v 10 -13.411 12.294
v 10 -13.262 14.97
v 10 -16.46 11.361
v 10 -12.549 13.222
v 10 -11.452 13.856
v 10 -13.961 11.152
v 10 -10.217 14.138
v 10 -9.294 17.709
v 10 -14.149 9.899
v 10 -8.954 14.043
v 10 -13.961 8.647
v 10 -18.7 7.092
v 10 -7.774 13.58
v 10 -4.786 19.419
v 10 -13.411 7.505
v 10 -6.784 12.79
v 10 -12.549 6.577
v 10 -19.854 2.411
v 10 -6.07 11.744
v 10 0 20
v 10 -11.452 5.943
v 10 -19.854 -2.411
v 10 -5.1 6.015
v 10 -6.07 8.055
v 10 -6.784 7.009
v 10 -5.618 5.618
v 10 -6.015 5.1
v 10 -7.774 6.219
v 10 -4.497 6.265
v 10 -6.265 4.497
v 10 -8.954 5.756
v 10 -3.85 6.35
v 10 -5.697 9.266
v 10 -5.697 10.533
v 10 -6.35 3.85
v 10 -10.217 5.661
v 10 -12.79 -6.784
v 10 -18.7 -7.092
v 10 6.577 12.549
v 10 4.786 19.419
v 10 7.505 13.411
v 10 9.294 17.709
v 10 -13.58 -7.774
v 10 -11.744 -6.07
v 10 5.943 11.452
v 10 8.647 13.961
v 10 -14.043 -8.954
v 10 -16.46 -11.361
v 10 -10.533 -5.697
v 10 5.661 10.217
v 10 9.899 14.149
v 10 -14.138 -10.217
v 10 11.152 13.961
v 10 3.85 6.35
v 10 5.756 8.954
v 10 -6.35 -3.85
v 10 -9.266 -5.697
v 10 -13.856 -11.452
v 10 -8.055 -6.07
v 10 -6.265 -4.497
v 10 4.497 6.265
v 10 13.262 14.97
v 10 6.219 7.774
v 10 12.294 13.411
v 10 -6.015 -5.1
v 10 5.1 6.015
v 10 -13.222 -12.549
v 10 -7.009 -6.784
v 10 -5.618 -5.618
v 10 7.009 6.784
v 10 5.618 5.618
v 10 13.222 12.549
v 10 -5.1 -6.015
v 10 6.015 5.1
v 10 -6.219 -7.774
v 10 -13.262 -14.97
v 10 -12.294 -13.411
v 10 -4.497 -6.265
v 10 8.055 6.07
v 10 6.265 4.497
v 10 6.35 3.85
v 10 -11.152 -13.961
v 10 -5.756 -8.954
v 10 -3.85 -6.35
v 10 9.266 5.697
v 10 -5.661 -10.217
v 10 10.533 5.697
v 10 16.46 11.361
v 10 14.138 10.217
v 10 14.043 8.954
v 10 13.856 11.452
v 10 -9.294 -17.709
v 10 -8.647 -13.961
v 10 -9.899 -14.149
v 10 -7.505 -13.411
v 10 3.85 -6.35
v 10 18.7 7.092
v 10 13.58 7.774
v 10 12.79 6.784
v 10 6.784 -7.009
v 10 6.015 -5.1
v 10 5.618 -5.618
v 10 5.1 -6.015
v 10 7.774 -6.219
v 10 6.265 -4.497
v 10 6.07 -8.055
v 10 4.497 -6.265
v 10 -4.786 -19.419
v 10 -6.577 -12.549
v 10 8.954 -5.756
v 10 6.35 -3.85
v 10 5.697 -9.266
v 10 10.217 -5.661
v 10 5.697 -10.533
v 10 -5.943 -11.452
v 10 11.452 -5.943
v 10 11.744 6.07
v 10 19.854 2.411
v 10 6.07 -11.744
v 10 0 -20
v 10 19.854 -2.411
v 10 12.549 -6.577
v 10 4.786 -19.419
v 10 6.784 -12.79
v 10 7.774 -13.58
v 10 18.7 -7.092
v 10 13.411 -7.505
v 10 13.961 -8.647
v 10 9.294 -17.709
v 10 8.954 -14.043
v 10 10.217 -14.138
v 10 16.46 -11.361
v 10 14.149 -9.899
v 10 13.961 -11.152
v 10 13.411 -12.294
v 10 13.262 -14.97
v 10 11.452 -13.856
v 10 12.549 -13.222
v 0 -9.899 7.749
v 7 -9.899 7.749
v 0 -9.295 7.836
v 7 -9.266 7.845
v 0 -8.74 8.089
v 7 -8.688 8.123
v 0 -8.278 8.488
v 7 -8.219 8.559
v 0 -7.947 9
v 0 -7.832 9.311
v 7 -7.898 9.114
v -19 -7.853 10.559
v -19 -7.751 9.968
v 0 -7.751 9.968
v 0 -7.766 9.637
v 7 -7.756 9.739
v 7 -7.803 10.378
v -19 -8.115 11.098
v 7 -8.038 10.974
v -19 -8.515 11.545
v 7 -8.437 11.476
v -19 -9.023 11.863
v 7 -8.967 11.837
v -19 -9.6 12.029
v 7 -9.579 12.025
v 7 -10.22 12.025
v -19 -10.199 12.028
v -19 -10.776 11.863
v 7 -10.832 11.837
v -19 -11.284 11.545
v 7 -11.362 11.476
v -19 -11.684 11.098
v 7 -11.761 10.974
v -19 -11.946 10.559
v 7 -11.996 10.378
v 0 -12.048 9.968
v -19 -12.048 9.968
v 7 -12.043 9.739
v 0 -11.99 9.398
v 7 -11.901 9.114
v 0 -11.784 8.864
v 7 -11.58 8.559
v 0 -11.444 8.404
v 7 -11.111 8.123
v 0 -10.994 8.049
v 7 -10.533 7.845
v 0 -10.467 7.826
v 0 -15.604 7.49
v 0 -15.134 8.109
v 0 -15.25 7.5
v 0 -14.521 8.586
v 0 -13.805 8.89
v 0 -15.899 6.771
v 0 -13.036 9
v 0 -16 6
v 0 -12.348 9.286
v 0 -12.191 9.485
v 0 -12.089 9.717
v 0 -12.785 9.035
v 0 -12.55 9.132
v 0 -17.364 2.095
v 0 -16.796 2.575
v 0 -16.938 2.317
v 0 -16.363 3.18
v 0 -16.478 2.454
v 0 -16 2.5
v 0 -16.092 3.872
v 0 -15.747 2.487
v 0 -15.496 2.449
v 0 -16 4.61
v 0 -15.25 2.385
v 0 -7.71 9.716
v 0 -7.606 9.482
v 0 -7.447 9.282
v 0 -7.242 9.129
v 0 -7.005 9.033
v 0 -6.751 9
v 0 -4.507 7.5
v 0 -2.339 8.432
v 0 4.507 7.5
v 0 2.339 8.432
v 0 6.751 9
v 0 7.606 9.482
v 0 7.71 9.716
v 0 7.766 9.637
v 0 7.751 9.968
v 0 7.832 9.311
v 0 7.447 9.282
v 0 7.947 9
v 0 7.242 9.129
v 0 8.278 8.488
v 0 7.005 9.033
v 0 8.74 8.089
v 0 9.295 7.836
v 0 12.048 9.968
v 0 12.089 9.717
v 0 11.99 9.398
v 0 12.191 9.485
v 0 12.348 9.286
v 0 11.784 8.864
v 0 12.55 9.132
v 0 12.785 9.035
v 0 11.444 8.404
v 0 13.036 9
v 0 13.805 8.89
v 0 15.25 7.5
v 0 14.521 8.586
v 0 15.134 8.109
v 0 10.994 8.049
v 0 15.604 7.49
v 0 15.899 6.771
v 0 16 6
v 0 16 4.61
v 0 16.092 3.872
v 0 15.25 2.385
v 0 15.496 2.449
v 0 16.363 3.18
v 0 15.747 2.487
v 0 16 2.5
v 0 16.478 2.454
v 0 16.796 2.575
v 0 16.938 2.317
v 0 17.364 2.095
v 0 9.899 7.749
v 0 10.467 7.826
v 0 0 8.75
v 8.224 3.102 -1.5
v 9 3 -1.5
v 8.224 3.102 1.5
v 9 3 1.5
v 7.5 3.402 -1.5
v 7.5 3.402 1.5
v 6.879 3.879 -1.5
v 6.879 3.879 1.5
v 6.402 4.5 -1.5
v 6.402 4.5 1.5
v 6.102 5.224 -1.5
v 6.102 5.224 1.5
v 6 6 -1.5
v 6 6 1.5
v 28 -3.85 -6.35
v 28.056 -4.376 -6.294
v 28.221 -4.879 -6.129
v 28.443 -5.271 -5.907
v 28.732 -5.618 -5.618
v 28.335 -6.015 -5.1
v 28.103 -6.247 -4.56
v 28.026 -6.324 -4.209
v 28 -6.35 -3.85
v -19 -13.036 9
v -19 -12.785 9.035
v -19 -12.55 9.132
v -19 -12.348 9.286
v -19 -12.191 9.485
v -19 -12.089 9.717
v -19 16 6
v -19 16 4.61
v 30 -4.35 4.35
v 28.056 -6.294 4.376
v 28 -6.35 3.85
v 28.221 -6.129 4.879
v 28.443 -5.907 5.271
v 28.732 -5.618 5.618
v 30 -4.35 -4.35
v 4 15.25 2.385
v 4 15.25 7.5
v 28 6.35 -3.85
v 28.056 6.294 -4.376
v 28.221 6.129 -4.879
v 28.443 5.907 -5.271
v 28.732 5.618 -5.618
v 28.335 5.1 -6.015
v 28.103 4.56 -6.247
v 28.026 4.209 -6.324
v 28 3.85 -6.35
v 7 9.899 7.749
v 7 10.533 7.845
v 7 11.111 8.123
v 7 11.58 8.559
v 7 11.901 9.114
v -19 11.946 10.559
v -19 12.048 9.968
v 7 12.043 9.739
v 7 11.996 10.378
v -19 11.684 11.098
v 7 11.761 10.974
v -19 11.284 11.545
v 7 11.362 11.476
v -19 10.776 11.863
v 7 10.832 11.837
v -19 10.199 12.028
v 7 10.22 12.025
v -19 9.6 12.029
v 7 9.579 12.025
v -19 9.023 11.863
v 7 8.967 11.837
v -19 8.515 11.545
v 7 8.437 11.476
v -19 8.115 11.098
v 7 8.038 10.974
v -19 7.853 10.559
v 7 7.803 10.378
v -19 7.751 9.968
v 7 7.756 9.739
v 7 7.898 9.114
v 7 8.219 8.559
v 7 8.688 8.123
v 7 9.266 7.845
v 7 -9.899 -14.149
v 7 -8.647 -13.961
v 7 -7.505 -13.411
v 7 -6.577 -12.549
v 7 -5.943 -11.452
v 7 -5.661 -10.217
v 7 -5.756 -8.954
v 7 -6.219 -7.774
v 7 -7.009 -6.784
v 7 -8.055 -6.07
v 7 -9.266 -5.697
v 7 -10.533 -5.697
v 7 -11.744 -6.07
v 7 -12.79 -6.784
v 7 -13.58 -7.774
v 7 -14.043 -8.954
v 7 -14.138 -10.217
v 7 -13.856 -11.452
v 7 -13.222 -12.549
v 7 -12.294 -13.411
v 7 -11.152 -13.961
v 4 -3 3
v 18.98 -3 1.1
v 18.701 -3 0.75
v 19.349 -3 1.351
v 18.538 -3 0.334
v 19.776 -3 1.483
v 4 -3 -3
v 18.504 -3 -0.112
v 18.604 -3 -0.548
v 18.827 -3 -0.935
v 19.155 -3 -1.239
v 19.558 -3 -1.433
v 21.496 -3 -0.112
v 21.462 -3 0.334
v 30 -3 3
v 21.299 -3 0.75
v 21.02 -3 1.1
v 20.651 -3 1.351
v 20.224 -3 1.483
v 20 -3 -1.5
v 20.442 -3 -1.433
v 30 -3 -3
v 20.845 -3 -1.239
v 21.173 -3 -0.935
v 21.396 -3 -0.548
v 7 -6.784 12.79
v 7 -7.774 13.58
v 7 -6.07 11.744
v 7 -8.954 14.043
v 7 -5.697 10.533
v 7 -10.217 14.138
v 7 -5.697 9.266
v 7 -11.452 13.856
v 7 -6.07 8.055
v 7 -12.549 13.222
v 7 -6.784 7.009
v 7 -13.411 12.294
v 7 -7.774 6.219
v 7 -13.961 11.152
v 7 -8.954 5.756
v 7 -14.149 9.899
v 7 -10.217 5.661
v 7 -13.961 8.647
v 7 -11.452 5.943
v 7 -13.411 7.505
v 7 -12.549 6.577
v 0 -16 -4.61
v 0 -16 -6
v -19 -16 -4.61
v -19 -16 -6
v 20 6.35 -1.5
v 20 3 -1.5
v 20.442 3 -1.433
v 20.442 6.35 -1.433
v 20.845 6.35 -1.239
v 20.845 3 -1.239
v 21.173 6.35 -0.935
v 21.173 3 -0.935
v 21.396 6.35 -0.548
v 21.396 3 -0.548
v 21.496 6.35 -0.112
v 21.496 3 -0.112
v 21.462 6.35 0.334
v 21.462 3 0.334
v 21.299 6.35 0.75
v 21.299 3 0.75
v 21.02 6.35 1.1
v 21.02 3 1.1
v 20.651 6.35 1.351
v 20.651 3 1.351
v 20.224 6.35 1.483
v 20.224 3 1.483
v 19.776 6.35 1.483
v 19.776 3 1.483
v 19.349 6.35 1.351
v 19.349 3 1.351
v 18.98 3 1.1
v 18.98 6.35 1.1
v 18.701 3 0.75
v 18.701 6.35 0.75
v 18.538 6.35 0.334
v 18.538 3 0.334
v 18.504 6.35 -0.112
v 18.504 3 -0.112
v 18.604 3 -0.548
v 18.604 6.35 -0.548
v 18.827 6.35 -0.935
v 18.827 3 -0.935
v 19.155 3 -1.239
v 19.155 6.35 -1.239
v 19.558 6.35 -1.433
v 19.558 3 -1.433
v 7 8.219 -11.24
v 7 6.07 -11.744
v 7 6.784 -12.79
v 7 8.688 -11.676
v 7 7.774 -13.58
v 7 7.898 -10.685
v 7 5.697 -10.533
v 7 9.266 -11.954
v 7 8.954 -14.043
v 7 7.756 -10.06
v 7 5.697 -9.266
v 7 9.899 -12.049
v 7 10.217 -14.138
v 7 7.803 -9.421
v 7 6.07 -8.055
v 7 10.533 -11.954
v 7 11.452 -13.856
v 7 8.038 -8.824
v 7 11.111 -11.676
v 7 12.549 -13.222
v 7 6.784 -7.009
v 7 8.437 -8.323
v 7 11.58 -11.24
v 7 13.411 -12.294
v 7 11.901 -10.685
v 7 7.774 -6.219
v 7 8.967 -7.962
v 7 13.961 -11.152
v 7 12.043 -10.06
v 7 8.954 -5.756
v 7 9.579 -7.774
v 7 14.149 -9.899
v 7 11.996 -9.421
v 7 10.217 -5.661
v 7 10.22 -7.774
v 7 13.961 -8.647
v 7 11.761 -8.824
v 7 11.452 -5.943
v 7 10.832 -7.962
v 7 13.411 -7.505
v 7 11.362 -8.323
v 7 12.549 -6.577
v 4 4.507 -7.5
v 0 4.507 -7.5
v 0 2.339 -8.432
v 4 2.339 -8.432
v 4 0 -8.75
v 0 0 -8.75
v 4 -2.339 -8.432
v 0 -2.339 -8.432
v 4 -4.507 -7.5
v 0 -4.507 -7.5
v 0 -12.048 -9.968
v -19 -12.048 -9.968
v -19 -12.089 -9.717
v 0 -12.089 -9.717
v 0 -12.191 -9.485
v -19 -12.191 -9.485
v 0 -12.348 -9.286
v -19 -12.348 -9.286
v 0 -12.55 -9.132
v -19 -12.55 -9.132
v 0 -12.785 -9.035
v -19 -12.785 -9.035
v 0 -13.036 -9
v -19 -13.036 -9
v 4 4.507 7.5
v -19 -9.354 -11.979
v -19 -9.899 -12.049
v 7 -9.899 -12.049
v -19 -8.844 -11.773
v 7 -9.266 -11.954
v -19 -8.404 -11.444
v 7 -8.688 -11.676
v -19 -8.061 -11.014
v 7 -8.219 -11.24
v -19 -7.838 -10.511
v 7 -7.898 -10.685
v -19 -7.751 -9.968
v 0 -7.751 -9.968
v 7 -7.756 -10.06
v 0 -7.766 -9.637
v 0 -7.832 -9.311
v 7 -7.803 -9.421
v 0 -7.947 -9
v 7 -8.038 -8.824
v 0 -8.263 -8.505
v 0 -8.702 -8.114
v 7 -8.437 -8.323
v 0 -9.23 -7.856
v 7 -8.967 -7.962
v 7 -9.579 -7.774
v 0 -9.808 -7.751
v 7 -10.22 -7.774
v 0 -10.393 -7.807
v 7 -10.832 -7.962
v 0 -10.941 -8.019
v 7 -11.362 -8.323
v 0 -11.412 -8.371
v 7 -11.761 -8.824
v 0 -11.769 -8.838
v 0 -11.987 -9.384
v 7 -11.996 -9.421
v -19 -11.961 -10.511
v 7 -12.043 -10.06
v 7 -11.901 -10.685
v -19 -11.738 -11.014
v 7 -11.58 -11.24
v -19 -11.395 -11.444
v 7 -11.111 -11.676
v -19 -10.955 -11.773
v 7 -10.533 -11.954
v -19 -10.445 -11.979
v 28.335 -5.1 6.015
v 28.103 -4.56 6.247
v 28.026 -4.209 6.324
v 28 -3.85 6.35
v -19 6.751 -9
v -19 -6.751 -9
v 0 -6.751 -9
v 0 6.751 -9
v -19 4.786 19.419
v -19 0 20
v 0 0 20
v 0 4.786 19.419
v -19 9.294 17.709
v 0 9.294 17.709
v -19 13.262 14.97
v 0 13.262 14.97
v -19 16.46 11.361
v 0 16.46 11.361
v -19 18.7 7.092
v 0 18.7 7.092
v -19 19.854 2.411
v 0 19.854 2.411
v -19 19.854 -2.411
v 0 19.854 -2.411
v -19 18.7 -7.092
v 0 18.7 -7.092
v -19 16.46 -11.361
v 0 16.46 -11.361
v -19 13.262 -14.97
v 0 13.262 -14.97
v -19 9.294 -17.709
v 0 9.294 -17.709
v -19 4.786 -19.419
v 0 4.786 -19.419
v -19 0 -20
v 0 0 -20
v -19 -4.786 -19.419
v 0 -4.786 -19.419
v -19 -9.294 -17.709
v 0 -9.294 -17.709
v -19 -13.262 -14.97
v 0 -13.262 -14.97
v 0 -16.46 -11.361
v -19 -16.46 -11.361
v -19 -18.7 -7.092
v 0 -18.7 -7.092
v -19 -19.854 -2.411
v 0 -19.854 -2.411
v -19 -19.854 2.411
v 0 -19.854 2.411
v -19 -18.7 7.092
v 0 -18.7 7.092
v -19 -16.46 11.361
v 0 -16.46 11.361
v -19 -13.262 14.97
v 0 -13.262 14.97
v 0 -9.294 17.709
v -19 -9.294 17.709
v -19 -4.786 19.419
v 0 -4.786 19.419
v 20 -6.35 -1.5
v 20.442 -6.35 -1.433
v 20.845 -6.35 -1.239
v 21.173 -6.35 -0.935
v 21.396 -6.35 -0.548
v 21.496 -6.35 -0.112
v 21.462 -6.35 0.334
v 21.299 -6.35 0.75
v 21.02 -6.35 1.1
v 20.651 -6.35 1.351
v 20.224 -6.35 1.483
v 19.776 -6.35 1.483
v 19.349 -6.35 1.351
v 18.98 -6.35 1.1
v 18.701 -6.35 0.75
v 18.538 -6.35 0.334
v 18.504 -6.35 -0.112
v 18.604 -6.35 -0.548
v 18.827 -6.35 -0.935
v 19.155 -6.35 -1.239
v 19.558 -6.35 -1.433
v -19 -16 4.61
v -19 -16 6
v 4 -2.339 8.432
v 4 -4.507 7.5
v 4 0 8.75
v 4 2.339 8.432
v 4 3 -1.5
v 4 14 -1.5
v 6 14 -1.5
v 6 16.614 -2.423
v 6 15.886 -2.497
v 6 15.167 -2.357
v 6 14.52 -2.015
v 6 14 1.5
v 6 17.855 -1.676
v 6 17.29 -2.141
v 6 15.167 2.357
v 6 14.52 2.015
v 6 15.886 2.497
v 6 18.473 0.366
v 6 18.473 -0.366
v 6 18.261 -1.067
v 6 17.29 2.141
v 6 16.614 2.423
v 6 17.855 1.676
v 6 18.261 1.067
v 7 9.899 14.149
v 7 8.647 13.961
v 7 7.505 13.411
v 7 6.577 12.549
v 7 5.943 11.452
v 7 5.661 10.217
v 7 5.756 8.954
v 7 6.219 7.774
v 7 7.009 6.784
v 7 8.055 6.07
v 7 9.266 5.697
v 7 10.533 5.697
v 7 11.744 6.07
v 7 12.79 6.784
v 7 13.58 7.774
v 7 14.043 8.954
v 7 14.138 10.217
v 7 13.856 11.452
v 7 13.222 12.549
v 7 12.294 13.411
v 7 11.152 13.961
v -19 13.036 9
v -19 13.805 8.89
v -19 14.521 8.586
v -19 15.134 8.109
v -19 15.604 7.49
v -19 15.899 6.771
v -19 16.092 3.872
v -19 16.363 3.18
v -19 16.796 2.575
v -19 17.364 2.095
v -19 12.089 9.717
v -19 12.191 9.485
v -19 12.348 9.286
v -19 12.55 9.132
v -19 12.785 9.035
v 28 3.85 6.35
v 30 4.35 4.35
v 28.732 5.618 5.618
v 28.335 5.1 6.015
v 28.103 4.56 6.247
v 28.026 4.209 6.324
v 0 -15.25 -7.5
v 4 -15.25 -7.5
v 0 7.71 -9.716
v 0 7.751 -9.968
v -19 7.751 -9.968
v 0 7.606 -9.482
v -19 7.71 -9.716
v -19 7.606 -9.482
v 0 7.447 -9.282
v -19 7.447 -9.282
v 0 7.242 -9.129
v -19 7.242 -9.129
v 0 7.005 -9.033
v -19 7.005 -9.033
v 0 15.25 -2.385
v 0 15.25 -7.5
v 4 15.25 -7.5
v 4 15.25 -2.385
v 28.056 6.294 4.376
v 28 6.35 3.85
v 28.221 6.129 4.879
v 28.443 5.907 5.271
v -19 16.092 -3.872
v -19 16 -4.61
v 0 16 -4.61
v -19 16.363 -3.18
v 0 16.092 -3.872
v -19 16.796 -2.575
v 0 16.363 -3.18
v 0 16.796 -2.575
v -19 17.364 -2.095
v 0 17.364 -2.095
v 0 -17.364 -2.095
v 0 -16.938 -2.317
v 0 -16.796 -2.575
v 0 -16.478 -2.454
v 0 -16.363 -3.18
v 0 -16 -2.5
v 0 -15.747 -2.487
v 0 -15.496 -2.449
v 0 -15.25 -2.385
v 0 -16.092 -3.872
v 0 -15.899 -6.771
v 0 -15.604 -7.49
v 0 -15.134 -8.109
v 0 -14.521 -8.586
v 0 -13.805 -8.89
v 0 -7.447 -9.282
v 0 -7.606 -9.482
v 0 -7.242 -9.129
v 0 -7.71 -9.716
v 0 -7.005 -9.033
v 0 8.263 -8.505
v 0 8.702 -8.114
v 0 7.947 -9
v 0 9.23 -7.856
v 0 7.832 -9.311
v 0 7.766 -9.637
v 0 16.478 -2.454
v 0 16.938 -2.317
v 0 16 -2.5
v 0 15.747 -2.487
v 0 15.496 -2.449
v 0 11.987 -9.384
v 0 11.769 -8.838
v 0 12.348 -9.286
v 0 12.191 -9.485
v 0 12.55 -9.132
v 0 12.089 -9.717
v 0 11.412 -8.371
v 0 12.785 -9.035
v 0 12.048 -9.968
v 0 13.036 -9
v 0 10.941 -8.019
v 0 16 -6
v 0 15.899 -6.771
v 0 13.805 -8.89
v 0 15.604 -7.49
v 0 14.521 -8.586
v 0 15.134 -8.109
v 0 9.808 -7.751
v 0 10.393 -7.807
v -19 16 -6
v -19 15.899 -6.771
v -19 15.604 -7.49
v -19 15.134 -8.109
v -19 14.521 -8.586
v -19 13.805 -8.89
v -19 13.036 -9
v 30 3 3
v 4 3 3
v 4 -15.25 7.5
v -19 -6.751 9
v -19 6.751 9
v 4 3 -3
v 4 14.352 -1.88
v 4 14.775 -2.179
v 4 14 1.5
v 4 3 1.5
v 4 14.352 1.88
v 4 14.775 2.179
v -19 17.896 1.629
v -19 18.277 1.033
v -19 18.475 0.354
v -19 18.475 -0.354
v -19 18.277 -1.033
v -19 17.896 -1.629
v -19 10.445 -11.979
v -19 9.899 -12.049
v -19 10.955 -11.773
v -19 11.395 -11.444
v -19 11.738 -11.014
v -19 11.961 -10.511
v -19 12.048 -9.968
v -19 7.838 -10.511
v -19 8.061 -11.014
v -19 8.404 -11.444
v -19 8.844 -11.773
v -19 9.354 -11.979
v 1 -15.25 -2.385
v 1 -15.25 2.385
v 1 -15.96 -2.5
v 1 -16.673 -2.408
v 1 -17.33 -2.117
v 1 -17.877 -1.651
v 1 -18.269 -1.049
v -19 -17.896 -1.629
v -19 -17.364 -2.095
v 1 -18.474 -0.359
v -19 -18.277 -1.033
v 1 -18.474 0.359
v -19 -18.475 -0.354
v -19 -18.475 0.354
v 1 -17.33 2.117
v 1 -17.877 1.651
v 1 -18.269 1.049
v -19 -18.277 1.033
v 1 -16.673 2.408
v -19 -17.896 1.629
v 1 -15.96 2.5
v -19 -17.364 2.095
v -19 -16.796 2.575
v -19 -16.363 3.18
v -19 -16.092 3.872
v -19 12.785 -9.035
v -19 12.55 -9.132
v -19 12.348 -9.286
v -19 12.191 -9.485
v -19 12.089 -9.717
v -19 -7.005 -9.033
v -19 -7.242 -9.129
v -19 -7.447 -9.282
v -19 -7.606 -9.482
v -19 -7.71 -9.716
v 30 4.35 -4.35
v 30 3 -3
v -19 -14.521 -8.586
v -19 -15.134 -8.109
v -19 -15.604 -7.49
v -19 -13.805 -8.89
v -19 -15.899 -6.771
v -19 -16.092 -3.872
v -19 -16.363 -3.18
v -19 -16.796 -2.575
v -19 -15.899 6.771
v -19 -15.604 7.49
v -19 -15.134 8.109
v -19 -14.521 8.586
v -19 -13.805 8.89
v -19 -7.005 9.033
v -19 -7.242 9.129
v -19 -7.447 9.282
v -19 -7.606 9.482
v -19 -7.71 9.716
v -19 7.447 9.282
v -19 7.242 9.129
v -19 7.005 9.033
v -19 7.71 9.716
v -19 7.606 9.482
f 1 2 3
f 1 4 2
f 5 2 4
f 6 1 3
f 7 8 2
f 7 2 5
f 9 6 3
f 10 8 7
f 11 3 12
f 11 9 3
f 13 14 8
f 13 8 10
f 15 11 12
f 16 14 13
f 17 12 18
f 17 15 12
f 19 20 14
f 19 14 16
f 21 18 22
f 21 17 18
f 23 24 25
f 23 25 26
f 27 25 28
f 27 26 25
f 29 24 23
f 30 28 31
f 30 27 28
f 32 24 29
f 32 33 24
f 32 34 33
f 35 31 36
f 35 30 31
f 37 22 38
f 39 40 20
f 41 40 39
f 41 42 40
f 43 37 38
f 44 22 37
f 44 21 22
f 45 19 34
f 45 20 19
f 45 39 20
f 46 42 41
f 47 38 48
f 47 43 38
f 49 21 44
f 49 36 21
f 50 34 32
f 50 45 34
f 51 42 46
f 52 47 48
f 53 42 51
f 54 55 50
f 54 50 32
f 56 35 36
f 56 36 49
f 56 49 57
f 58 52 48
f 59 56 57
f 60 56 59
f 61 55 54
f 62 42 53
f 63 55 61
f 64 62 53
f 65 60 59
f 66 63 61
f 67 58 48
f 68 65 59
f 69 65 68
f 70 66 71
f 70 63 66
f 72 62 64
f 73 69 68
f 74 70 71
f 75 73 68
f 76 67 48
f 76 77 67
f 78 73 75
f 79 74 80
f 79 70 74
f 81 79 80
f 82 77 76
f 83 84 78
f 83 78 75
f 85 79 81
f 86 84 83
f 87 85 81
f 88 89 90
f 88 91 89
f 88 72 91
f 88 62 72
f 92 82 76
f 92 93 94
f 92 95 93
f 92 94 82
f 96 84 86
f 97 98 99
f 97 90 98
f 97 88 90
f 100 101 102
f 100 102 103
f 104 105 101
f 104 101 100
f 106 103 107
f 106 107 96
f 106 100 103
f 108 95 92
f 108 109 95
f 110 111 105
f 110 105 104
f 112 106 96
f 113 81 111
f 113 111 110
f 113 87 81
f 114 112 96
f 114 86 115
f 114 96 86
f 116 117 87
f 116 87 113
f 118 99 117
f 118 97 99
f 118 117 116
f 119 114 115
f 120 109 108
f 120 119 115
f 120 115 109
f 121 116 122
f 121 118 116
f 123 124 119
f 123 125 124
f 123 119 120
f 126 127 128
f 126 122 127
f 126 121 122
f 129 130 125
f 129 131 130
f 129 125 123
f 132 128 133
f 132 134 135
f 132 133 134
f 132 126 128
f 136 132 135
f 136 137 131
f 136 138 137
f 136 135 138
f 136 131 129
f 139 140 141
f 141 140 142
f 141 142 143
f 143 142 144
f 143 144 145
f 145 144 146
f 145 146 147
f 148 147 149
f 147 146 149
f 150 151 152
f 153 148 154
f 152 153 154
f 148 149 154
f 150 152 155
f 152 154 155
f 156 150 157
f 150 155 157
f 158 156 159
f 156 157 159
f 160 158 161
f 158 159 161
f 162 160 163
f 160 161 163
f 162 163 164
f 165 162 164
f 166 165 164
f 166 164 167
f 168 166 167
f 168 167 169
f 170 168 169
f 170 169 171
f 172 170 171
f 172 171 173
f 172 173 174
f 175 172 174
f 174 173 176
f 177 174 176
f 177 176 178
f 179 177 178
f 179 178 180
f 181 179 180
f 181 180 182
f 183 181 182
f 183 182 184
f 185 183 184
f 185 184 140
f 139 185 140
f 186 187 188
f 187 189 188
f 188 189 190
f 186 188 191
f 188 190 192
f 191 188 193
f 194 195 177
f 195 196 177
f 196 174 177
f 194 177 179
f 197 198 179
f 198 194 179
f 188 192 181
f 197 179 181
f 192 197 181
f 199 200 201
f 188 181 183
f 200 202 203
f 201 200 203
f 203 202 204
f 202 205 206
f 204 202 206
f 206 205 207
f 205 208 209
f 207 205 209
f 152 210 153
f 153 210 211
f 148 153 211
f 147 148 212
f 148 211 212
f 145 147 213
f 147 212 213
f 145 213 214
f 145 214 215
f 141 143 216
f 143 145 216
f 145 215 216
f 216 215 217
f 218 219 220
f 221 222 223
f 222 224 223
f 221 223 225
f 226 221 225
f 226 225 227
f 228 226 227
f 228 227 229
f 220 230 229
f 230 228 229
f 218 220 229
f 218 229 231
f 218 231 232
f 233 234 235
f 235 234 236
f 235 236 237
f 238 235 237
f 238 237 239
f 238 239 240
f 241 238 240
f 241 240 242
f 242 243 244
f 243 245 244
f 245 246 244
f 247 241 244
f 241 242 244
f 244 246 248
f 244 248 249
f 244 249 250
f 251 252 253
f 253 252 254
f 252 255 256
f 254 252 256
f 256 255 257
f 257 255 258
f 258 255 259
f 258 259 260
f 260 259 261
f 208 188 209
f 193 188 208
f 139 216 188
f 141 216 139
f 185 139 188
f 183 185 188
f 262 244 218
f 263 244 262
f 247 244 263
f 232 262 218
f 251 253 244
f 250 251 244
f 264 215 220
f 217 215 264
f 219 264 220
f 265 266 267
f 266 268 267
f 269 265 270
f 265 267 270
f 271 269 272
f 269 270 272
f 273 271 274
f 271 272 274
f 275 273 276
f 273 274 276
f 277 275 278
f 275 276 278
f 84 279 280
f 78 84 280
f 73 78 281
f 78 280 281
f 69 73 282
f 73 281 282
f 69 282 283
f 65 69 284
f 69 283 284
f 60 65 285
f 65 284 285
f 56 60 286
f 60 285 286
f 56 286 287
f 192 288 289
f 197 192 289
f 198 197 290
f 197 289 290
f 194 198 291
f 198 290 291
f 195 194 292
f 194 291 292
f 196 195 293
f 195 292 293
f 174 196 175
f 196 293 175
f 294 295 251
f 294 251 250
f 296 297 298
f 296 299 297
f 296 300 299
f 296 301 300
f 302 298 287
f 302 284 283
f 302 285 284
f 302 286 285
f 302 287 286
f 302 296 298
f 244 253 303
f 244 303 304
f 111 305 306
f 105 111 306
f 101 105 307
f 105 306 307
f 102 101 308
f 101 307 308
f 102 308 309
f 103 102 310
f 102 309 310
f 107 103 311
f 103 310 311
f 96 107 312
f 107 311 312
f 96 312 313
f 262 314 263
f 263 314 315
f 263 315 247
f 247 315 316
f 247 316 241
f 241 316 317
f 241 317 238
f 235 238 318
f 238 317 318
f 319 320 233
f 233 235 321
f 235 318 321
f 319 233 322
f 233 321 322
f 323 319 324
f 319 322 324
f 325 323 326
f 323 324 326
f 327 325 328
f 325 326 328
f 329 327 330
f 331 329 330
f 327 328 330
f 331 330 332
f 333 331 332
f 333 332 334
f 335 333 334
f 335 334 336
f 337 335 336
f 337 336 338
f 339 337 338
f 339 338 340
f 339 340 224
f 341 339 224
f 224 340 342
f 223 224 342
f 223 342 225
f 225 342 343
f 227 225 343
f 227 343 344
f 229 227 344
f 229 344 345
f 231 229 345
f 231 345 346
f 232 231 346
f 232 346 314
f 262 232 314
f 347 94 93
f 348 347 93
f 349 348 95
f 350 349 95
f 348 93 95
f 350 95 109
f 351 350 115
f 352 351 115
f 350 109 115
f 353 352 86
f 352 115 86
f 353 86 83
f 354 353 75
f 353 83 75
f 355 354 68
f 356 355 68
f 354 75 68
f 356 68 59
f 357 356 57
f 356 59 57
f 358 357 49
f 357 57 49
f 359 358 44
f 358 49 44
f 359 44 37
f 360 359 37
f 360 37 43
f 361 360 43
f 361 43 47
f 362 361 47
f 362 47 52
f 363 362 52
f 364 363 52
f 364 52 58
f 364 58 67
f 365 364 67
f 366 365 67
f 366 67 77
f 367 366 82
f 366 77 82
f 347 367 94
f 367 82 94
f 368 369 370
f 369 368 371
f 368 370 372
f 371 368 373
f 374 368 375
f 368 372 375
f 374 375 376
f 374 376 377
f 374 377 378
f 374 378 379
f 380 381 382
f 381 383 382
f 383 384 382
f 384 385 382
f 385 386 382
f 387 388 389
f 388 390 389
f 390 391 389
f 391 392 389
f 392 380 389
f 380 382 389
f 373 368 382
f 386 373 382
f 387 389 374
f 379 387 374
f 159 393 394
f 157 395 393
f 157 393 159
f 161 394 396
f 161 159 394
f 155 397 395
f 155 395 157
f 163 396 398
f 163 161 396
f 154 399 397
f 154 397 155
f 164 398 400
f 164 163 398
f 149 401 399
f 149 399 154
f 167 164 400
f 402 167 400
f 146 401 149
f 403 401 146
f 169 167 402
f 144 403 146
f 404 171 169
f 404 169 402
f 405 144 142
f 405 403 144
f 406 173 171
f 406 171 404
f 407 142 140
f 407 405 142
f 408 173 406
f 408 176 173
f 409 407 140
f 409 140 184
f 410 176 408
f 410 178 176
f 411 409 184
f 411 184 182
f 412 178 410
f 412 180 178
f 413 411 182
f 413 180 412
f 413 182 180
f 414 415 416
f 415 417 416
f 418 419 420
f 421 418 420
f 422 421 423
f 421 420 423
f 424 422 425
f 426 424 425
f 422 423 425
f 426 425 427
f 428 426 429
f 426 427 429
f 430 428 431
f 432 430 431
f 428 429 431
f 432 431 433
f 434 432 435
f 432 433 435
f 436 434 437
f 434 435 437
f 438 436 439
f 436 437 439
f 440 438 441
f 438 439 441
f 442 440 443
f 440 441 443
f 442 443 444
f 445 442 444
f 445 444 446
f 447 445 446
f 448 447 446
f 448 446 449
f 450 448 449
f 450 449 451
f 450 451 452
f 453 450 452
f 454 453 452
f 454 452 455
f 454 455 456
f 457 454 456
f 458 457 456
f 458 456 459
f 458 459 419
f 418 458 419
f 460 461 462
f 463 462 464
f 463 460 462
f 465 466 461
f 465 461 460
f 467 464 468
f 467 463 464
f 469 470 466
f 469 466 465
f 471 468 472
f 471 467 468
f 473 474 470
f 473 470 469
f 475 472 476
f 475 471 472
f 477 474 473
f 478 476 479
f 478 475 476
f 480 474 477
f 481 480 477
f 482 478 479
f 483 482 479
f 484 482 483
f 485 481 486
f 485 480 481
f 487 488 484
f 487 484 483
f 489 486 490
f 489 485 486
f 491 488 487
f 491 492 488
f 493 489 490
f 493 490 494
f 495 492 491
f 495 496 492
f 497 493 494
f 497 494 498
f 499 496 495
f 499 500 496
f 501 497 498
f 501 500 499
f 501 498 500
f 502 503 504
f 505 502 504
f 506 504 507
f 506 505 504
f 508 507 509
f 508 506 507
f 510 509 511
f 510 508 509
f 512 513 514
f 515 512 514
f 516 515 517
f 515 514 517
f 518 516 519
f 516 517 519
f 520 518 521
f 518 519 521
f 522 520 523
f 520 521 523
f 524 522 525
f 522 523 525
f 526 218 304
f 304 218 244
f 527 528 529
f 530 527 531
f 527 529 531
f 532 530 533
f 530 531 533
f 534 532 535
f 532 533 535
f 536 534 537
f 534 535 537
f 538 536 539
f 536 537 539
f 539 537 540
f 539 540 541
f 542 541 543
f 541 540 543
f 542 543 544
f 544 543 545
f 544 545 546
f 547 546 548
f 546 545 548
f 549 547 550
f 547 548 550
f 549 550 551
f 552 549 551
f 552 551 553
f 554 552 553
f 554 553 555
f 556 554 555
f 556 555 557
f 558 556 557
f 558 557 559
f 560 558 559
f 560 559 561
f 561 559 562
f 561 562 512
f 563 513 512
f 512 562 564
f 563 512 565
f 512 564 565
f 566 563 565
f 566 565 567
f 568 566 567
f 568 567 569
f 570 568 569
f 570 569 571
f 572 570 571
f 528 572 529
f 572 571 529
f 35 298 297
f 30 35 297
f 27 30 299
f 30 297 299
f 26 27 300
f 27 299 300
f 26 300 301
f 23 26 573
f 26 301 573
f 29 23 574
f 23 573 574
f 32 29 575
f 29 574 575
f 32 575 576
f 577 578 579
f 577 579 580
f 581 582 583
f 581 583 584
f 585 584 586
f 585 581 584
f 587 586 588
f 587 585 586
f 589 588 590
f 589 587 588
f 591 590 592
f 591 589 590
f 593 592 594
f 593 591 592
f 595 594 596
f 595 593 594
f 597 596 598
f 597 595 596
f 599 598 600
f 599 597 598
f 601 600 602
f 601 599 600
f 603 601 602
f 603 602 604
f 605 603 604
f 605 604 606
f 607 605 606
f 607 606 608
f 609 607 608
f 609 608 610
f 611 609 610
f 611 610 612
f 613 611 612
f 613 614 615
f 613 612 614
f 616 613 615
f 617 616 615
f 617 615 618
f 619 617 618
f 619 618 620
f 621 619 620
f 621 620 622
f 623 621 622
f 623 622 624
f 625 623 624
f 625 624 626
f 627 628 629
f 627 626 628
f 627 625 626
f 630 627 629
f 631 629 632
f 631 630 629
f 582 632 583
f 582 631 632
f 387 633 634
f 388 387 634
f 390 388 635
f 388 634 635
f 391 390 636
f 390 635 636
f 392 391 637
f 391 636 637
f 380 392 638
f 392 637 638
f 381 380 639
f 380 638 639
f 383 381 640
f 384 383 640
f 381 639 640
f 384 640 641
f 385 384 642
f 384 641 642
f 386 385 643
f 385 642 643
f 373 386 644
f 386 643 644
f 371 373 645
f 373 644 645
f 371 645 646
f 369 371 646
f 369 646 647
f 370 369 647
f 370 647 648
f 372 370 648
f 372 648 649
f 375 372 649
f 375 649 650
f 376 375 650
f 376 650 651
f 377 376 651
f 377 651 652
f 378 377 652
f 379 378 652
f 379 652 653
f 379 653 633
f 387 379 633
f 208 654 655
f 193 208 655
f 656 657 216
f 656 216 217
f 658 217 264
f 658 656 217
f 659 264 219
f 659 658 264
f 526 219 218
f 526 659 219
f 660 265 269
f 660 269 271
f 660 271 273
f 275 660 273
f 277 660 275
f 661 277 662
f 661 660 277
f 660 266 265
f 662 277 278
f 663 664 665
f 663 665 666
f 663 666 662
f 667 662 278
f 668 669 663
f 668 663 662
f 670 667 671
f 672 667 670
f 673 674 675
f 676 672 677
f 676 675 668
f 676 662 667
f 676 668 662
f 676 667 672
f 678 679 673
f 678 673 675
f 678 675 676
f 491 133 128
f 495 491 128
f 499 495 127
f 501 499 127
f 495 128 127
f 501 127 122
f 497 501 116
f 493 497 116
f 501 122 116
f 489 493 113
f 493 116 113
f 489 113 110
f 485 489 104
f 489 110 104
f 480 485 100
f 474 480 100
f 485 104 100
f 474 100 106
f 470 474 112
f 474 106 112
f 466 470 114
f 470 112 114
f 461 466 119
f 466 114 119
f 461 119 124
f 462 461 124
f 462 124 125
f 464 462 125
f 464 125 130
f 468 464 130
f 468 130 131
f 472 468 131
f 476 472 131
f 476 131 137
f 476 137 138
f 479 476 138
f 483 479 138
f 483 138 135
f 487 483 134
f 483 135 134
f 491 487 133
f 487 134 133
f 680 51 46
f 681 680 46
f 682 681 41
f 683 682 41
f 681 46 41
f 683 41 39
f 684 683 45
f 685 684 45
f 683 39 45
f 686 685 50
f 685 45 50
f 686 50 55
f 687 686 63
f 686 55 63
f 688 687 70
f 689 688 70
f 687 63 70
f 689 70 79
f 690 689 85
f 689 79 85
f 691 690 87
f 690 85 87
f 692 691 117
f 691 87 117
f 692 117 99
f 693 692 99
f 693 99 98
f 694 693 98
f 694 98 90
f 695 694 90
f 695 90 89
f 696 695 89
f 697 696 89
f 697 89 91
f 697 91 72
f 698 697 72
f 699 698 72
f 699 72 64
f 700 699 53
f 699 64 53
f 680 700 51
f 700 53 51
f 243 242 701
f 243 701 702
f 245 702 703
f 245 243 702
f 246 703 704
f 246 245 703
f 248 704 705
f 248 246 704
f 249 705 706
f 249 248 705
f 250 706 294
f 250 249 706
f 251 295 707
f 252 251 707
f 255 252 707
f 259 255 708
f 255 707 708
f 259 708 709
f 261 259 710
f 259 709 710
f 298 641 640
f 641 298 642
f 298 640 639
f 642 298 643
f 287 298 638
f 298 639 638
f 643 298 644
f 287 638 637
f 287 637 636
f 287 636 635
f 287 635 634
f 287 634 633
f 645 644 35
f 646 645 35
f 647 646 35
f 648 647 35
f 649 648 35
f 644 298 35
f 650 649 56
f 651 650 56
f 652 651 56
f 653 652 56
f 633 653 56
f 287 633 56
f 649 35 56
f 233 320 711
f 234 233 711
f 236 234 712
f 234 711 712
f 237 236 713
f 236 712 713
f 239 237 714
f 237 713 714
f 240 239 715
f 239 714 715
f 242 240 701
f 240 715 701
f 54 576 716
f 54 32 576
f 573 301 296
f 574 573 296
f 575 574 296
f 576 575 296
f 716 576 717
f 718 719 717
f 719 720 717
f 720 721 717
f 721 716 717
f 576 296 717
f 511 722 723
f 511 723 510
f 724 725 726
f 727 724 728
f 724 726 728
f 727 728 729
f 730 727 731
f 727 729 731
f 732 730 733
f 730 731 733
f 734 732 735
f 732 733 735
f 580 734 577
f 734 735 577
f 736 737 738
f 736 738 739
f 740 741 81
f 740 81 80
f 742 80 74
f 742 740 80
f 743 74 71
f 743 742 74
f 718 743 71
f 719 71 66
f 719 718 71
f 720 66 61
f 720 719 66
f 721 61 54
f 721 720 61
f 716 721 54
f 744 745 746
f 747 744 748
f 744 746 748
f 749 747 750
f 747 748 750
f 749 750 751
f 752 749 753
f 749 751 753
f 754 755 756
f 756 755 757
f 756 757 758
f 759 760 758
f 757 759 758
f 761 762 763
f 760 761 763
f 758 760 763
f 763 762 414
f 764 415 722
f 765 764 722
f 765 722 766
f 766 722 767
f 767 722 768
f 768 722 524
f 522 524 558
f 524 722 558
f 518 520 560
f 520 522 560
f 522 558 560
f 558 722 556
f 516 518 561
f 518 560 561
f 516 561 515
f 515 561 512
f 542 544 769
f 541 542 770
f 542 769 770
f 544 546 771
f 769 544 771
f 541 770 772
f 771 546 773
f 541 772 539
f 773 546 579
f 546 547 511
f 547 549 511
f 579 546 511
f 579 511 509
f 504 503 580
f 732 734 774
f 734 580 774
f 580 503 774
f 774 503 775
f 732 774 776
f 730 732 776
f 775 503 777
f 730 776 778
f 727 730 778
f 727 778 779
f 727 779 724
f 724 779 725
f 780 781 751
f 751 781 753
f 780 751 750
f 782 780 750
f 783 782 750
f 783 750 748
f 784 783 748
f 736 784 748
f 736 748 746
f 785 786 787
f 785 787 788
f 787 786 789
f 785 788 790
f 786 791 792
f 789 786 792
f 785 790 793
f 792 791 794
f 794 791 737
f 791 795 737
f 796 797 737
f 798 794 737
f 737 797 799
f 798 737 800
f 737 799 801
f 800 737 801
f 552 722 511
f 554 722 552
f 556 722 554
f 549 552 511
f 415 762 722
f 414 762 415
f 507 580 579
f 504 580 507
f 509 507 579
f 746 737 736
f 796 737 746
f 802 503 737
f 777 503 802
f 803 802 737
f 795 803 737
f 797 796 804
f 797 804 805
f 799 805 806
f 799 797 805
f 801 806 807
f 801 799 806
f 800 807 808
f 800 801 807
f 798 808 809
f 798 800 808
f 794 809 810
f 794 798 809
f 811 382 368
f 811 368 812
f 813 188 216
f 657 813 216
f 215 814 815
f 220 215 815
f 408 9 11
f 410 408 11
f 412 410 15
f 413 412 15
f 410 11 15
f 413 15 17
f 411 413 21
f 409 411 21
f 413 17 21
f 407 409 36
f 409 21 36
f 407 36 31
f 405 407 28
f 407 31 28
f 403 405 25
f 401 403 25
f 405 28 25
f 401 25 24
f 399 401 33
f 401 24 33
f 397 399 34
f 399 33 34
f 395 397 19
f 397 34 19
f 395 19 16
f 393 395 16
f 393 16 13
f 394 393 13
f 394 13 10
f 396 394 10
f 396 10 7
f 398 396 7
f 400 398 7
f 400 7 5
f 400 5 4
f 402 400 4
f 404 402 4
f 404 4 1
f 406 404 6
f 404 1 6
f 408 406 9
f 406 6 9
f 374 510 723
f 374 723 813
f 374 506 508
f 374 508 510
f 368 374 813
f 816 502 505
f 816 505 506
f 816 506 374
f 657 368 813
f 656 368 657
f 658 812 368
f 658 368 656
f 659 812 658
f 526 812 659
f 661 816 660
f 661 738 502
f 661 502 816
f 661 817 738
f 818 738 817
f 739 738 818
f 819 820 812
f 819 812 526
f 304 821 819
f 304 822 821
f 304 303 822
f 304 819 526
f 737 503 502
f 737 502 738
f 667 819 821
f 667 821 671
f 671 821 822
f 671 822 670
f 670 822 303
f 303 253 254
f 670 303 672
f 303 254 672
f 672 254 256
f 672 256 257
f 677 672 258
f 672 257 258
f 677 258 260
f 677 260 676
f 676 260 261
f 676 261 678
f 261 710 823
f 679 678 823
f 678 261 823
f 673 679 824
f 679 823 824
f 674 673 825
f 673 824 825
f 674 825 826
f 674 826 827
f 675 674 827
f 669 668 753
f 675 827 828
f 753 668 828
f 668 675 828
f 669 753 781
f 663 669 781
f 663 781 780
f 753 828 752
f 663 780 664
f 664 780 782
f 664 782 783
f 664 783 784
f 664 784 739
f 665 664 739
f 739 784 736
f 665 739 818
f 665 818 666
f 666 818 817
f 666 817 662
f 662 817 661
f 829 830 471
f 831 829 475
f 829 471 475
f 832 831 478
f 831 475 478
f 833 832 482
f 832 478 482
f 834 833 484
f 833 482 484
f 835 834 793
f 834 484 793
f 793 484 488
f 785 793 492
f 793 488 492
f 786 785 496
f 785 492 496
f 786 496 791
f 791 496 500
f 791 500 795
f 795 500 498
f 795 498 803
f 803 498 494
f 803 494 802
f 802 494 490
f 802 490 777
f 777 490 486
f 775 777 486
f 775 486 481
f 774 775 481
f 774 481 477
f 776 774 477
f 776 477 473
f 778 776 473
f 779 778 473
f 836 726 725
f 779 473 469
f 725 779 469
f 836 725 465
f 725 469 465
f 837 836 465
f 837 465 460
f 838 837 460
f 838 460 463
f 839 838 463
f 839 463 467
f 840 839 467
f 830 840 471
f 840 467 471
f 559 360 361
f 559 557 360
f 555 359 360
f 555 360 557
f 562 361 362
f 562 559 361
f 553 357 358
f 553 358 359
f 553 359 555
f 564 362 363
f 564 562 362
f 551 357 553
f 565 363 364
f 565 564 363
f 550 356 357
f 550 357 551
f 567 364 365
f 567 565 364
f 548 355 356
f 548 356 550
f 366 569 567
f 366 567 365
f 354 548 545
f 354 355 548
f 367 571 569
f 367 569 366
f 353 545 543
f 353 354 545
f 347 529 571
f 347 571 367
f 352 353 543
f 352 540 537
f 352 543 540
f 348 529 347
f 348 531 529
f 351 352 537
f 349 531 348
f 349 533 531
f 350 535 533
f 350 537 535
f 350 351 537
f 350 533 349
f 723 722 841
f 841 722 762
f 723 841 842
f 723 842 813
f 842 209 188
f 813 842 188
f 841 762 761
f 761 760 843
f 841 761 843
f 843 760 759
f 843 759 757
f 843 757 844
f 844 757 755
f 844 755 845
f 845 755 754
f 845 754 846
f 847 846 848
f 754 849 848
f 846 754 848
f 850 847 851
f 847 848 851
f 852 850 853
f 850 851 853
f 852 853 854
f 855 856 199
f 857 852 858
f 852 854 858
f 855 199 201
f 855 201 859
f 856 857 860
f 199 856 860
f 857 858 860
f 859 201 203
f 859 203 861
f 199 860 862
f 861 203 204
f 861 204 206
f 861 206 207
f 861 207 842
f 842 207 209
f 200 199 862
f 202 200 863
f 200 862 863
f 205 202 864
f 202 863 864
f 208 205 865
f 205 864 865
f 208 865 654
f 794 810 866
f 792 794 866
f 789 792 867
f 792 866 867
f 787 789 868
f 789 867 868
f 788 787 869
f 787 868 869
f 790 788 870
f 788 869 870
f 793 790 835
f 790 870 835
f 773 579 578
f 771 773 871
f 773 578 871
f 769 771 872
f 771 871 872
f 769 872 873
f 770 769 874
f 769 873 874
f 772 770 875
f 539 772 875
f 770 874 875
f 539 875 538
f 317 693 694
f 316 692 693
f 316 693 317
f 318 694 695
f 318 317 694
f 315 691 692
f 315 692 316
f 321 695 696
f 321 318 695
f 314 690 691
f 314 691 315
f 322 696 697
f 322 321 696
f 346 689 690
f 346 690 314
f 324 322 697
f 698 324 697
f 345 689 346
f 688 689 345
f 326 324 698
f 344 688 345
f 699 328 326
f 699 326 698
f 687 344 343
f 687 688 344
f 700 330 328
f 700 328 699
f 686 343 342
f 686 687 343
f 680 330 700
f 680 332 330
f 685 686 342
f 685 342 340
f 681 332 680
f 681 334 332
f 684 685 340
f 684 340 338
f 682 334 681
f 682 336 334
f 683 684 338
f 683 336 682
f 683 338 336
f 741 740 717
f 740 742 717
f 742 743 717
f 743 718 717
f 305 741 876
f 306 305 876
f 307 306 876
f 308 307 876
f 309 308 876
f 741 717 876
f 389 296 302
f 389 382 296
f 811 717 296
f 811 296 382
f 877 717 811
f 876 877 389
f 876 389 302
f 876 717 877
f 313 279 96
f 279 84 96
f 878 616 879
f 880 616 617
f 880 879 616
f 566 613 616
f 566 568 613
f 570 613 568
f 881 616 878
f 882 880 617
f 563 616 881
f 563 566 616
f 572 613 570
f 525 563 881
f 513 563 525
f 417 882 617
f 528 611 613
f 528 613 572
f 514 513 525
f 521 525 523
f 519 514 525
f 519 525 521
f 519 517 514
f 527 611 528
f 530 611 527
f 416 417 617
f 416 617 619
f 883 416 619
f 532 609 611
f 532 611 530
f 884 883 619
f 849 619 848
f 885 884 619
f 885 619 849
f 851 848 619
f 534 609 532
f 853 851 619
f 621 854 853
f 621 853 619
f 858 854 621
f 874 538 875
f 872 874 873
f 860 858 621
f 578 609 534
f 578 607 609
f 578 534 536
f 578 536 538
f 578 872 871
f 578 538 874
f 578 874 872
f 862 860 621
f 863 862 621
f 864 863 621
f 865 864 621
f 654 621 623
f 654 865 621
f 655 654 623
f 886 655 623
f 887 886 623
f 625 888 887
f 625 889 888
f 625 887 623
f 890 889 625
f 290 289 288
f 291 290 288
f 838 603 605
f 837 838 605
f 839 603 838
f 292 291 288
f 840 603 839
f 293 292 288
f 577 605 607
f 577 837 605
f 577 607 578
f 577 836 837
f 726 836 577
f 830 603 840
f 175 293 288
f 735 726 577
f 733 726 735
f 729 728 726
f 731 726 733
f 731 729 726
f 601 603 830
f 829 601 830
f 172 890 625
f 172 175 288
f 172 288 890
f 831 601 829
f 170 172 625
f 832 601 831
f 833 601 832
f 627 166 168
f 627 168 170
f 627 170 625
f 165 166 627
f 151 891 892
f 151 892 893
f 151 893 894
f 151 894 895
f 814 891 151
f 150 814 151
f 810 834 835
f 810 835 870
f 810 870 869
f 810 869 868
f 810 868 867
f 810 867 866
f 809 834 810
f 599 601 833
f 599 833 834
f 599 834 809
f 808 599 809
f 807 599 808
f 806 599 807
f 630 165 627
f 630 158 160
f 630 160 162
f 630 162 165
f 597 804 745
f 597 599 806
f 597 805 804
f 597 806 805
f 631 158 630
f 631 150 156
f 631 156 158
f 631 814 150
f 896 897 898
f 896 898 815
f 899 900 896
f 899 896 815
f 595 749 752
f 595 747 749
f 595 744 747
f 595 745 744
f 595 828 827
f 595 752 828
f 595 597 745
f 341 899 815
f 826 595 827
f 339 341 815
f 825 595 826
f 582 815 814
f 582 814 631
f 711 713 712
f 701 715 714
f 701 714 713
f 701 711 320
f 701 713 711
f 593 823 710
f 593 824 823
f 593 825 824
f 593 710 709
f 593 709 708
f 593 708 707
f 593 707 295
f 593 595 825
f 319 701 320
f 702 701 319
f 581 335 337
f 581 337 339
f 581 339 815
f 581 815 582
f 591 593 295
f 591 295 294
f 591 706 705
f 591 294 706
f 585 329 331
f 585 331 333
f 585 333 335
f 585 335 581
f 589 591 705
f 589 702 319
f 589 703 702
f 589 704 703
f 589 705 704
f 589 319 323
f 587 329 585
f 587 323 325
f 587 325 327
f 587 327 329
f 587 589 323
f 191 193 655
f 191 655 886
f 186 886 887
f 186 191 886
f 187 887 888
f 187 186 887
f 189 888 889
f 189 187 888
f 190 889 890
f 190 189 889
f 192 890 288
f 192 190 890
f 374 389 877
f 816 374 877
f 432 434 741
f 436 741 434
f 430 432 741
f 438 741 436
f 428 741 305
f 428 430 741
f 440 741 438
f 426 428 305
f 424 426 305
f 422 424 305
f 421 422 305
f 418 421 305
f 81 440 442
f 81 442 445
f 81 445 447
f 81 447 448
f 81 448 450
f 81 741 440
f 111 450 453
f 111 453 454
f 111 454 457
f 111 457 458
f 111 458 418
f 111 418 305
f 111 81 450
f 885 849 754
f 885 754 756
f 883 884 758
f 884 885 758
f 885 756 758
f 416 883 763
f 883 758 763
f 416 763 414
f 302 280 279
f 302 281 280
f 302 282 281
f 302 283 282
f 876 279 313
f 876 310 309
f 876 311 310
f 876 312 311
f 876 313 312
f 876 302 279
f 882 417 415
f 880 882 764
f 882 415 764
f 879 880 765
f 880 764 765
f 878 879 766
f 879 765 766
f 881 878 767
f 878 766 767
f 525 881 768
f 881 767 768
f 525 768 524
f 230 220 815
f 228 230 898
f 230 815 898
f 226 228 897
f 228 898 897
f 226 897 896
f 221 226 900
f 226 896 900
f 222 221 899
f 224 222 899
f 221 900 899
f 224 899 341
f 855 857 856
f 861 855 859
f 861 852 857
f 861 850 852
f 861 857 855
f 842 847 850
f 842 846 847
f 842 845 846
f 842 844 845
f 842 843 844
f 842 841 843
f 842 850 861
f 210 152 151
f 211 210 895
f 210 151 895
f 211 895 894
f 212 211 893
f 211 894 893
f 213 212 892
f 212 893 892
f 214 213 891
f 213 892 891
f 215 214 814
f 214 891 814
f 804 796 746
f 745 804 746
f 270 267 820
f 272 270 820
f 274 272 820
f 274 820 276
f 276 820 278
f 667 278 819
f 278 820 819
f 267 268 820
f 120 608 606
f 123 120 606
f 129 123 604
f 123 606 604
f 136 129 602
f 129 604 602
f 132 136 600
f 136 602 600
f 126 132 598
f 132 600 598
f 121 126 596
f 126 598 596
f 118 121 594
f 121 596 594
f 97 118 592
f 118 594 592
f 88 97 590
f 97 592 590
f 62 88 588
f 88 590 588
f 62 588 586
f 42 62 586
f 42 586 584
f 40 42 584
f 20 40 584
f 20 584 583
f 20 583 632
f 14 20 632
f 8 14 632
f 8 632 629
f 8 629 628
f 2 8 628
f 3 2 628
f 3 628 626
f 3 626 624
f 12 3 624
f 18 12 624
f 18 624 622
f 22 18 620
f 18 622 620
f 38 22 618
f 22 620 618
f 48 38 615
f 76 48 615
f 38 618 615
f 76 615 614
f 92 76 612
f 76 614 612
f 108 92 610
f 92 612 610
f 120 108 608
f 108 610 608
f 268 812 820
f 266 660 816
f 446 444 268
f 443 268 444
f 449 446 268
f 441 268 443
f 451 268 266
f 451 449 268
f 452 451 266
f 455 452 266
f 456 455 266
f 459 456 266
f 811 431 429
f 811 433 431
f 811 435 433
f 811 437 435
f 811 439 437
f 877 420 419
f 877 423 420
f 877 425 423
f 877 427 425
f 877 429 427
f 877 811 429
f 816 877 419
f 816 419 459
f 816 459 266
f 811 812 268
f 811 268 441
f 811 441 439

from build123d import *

# Parameters (mm, degrees)
SKETCH_1_R               = 20
EXTRUDE_1_DEPTH          = 10
SKETCH_2_W               = 15
SKETCH_2_H               = 30.5
CUT_EXTRUDE_1_DEPTH      = 4
SKETCH_3_R               = 8.75
CUT_EXTRUDE_2_DEPTH      = 4
EXTRUDE_START            = 19
SKETCH_4_R               = 20
SKETCH_4_W               = 18
SKETCH_4_H               = 32
EXTRUDE_2_DEPTH          = 19
FILLET_1_R               = 3
SKETCH_5_R               = 2.5
CUT_EXTRUDE_3_DEPTH      = 20
FILLET_2_R               = 3
SKETCH_6_R               = 2.15
CUT_EXTRUDE_4_DEPTH      = 43
FILLET_3_R               = 1
SKETCH_7_R               = 4.25
CUT_EXTRUDE_5_DEPTH      = 3
PATTERN_CIRCULAR_1_COUNT = 4
SKETCH_8_W               = 12.7
SKETCH_8_H               = 12.7
EXTRUDE_3_DEPTH          = 20
SKETCH_9_W               = 6
SKETCH_9_H               = 6
CUT_EXTRUDE_6_DEPTH      = 35
SKETCH_10_W              = 3
SKETCH_10_H              = 15
CUT_EXTRUDE_7_DEPTH      = 5
SKETCH_11_R              = 2.5
CUT_EXTRUDE_8_DEPTH      = 5
SKETCH_12_R              = 1.5
CUT_EXTRUDE_9_DEPTH      = 17
CHAMFER_1_SIZE           = 2
FILLET_4_R               = 3
FILLET_5_R               = 2.5


with BuildPart() as part:
    # 草图1 → 凸台-拉伸1 (new body)
    with BuildSketch(Plane(origin=(0, 0, 0), x_dir=(0, 0, -1), z_dir=(1, 0, 0))):
        Circle(SKETCH_1_R)
    extrude(amount=EXTRUDE_1_DEPTH)

    # 草图2 → 切除-拉伸1 (cut)
    with BuildSketch(Plane.ZY):
        Rectangle(SKETCH_2_W, SKETCH_2_H)
    extrude(amount=-CUT_EXTRUDE_1_DEPTH, mode=Mode.SUBTRACT)

    # 草图3 → 切除-拉伸2 (cut)
    with BuildSketch(Plane.ZY.offset(-4)):
        Circle(SKETCH_3_R)
    extrude(amount=CUT_EXTRUDE_2_DEPTH, mode=Mode.SUBTRACT)

    # 草图4 → 凸台-拉伸2 (add)
    with BuildSketch(Plane.ZY.offset(EXTRUDE_START)):
        Circle(SKETCH_4_R)
        Rectangle(SKETCH_4_W, SKETCH_4_H, mode=Mode.SUBTRACT)
    extrude(amount=-EXTRUDE_2_DEPTH)

    # 圆角1
    fillet_1_edges = [part.edges().sort_by_distance(p)[0] for p in [
        (-9.5, 16, 9),
        (-9.5, 16, -9),
        (-9.5, -16, -9),
        (-9.5, -16, 9),
    ]]
    fillet(fillet_1_edges, radius=FILLET_1_R)

    # 草图5 → 切除-拉伸3 (cut)
    with BuildSketch(Plane.ZY.offset(19)):
        with Locations((0, -16)):
            Circle(SKETCH_5_R)
        with Locations((0, 16)):
            Circle(SKETCH_5_R)
    extrude(amount=-CUT_EXTRUDE_3_DEPTH, mode=Mode.SUBTRACT)

    # 圆角2
    # the kernel refuses this fillet: 3 mm, written as the material it takes off along each edge
    with BuildSketch(Plane(origin=(-24.274430572, -16, 2.5), x_dir=(0, -0.9586814917396833, -0.2844816292764363), z_dir=(1, 0, 0))) as fillet_2_piece_1:
        with BuildLine():
            CenterArc((2.275853034, -2.876044475), FILLET_2_R, 106.527865575, 56.944268849)
            Line((-0.600191441, -2.022599587), (0, 0))
            ThreePointArc((0, 0), (0.711204073, -0.103296271), (1.422408146, 0))
        make_face()
    extrude(amount=24.274430572, mode=Mode.SUBTRACT)
    with BuildSketch(Plane(origin=(0, -16, -2.5), x_dir=(0, 0, -1), z_dir=(-1, 0, 0))) as fillet_2_piece_2:
        with BuildLine():
            CenterArc((2.109772229, 3), FILLET_2_R, 213.055731151, 56.944268849)
            ThreePointArc((-0.404648987, 1.363636364), (-0.103296271, 0.711204073), (0, 0))
            Line((0, 0), (2.109772229, 0))
        make_face()
    extrude(amount=24.274430572, mode=Mode.SUBTRACT)
    with BuildSketch(Plane(origin=(0, 16, -2.5), x_dir=(0, 0.9586814917396834, 0.2844816292764354), z_dir=(-1, 0, 0))) as fillet_2_piece_3:
        with BuildLine():
            CenterArc((2.275853034, 2.876044475), FILLET_2_R, 196.527865575, 56.944268849)
            Line((-0.600191441, 2.022599587), (0, 0))
            ThreePointArc((0, 0), (0.711204073, 0.103296271), (1.422408146, 0))
        make_face()
    extrude(amount=24.274430572, mode=Mode.SUBTRACT)
    with BuildSketch(Plane(origin=(-24.274430572, 16, 2.5), x_dir=(0, 0, 1), z_dir=(1, 0, 0))) as fillet_2_piece_4:
        with BuildLine():
            CenterArc((2.109772229, -3), FILLET_2_R, 90, 56.944268849)
            ThreePointArc((-0.404648987, -1.363636364), (-0.103296271, -0.711204073), (0, 0))
            Line((0, 0), (2.109772229, 0))
        make_face()
    extrude(amount=24.274430572, mode=Mode.SUBTRACT)

    # 草图6 → 切除-拉伸4 (cut)
    with BuildSketch(Plane(origin=(10, 0, 0), x_dir=(0, 0, -1), z_dir=(1, 0, 0))):
        with Locations((9.899494937, -9.899494937)):
            Circle(SKETCH_6_R)
        with Locations((-9.899494937, -9.899494937)):
            Circle(SKETCH_6_R)
        with Locations((-9.899494937, 9.899494937)):
            Circle(SKETCH_6_R)
        with Locations((9.899494937, 9.899494937)):
            Circle(SKETCH_6_R)
    extrude(amount=-CUT_EXTRUDE_4_DEPTH, mode=Mode.SUBTRACT)

    # 圆角3
    # the kernel refuses this fillet: 1 mm, written as the material it takes off along each edge
    with BuildSketch(Plane(origin=(-21.98900269, -7.946699797, 9), x_dir=(0, 0.1985408891964352, 0.9800926054802622), z_dir=(1, 0, 0)), Plane(origin=(-21.98900269, 7.946699797, -9), x_dir=(0, -0.19854088919647347, -0.9800926054802545), z_dir=(1, 0, 0))) as fillet_3_piece_1:
        with BuildLine():
            CenterArc((1.217468306, -0.973258884), FILLET_3_R, 103.280057781, 88.171589383)
            Line((0.237375701, -1.171799774), (0, 0))
            ThreePointArc((0, 0), (0.493878653, -0.057493399), (0.987757305, 0))
        make_face()
    extrude(amount=21.98900269, mode=Mode.SUBTRACT)
    with BuildSketch(Plane(origin=(-21.959087911, -11.852290077, 9), x_dir=(0, -0.999999983485678, -0.00018173784322620402), z_dir=(1, 0, 0)), Plane(origin=(-21.959087911, 11.852290077, -9), x_dir=(0, 0.9999999834856781, 0.00018173784322619477), z_dir=(1, 0, 0))) as fillet_3_piece_2:
        with BuildLine():
            CenterArc((1.195428513, -0.999930456), FILLET_3_R, 90.675724778, 87.490671362)
            Line((0.195940547, -0.967933494), (0.09599175, -0.964733798))
            ThreePointArc((0.09599175, -0.964733798), (0.056286672, -0.492404834), (-0.090835283, -0.041820466))
            Line((-0.090835283, -0.041820466), (1.8174e-05, 0.099999998))
            ThreePointArc((1.8174e-05, 0.099999998), (1.147728078, 0.099791416), (1.182455829, 0.099993046))
            Line((1.182455829, 0.099993046), (1.183635164, 0))
        make_face()
    extrude(amount=21.959087911, mode=Mode.SUBTRACT)
    with BuildSketch(Plane(origin=(-21.959087911, -11.852290077, -9), x_dir=(0, -0.19858553154825268, -0.98008356105982), z_dir=(1, 0, 0)), Plane(origin=(-21.959087911, 11.852290077, 9), x_dir=(0, 0.19858553154822475, 0.9800835610598256), z_dir=(1, 0, 0))) as fillet_3_piece_3:
        with BuildLine():
            CenterArc((1.217233349, -0.973269347), FILLET_3_R, 103.277447997, 87.490671362)
            Line((0.234841987, -1.160104066), (0.136602851, -1.178787538))
            ThreePointArc((0.136602851, -1.178787538), (0.129910229, -1.144710182), (-0.098008356, -0.019858553))
            Line((-0.098008356, -0.019858553), (0.022966667, 0.097326935))
            ThreePointArc((0.022966667, 0.097326935), (0.49378334, 0.042529095), (0.964600013, 0.097326935))
            Line((0.964600013, 0.097326935), (0.987566679, 0))
        make_face()
    extrude(amount=21.959087911, mode=Mode.SUBTRACT)
    with BuildSketch(Plane(origin=(-21.98900269, -7.946699797, -9), x_dir=(0, 1, 0), z_dir=(1, 0, 0)), Plane(origin=(-21.98900269, 7.946699797, 9), x_dir=(0, -1, 0), z_dir=(1, 0, 0))) as fillet_3_piece_4:
        with BuildLine():
            CenterArc((1.195601076, -1), FILLET_3_R, 90, 88.171589383)
            ThreePointArc((0.196110214, -0.968093631), (0.154403962, -0.472632025), (0, 0))
            Line((0, 0), (1.195601076, 0))
        make_face()
    extrude(amount=21.98900269, mode=Mode.SUBTRACT)

    # 草图7 → 切除-拉伸5 (cut)
    with BuildSketch(Plane(origin=(10, 0, 0), x_dir=(0, 0, -1), z_dir=(1, 0, 0))):
        with Locations((9.899494937, -9.899494937)):
            Circle(SKETCH_7_R)
    cut_extrude_5 = extrude(amount=-CUT_EXTRUDE_5_DEPTH, mode=Mode.SUBTRACT)

    # 阵列(圆周)1: 切除-拉伸5 ×4 about axis
    pattern_circular_1_axis = Axis((0, 0, 0), (1, 0, 0))
    for i in range(1, PATTERN_CIRCULAR_1_COUNT):
        add(cut_extrude_5.rotate(pattern_circular_1_axis, i * 360 / PATTERN_CIRCULAR_1_COUNT), mode=Mode.SUBTRACT)

    # 草图8 → 凸台-拉伸3 (add)
    with BuildSketch(Plane(origin=(10, 0, 0), x_dir=(0, 0, -1), z_dir=(1, 0, 0))):
        Rectangle(SKETCH_8_W, SKETCH_8_H)
    extrude(amount=EXTRUDE_3_DEPTH)

    # 草图9 → 切除-拉伸6 (cut)
    with BuildSketch(Plane(origin=(30, 0, 0), x_dir=(0, 0, -1), z_dir=(1, 0, 0))):
        Rectangle(SKETCH_9_W, SKETCH_9_H)
    extrude(amount=-CUT_EXTRUDE_6_DEPTH, mode=Mode.SUBTRACT)

    # 草图10 → 切除-拉伸7 (cut)
    with BuildSketch(Plane.ZY.offset(-1)):
        with Locations((0, 10.5)):
            Rectangle(SKETCH_10_W, SKETCH_10_H)
    extrude(amount=-CUT_EXTRUDE_7_DEPTH, mode=Mode.SUBTRACT)

    # 草图11 → 切除-拉伸8 (cut)
    with BuildSketch(Plane.ZY.offset(-1)):
        with Locations((0, 16)):
            Circle(SKETCH_11_R)
    extrude(amount=-CUT_EXTRUDE_8_DEPTH, mode=Mode.SUBTRACT)

    # 草图12 → 切除-拉伸9 (cut)
    with BuildSketch(Plane.XZ.offset(6.35)):
        with Locations(Location((20, 0, 0), (0, 0, 270))):
            Circle(SKETCH_12_R)
    extrude(amount=-CUT_EXTRUDE_9_DEPTH, mode=Mode.SUBTRACT)

    # 倒角1
    chamfer_1_edges = [part.edges().sort_by_distance(p)[0] for p in [
        (30, 0, 6.35),
        (30, -6.35, 0),
        (30, 0, -6.35),
        (30, 6.35, 0),
    ]]
    chamfer(chamfer_1_edges, length=CHAMFER_1_SIZE)

    # 圆角4
    fillet_4_edges = [part.edges().sort_by_distance(p)[0] for p in [
        (6, 3, 0),
    ]]
    fillet(fillet_4_edges, radius=FILLET_4_R)

    # 圆角5
    fillet_5_edges = [part.edges().sort_by_distance(p)[0] for p in [
        (19, -6.35, 6.35),
        (19, 6.35, 6.35),
        (19, 6.35, -6.35),
        (19, -6.35, -6.35),
    ]]
    fillet(fillet_5_edges, radius=FILLET_5_R)


solid = part.part
